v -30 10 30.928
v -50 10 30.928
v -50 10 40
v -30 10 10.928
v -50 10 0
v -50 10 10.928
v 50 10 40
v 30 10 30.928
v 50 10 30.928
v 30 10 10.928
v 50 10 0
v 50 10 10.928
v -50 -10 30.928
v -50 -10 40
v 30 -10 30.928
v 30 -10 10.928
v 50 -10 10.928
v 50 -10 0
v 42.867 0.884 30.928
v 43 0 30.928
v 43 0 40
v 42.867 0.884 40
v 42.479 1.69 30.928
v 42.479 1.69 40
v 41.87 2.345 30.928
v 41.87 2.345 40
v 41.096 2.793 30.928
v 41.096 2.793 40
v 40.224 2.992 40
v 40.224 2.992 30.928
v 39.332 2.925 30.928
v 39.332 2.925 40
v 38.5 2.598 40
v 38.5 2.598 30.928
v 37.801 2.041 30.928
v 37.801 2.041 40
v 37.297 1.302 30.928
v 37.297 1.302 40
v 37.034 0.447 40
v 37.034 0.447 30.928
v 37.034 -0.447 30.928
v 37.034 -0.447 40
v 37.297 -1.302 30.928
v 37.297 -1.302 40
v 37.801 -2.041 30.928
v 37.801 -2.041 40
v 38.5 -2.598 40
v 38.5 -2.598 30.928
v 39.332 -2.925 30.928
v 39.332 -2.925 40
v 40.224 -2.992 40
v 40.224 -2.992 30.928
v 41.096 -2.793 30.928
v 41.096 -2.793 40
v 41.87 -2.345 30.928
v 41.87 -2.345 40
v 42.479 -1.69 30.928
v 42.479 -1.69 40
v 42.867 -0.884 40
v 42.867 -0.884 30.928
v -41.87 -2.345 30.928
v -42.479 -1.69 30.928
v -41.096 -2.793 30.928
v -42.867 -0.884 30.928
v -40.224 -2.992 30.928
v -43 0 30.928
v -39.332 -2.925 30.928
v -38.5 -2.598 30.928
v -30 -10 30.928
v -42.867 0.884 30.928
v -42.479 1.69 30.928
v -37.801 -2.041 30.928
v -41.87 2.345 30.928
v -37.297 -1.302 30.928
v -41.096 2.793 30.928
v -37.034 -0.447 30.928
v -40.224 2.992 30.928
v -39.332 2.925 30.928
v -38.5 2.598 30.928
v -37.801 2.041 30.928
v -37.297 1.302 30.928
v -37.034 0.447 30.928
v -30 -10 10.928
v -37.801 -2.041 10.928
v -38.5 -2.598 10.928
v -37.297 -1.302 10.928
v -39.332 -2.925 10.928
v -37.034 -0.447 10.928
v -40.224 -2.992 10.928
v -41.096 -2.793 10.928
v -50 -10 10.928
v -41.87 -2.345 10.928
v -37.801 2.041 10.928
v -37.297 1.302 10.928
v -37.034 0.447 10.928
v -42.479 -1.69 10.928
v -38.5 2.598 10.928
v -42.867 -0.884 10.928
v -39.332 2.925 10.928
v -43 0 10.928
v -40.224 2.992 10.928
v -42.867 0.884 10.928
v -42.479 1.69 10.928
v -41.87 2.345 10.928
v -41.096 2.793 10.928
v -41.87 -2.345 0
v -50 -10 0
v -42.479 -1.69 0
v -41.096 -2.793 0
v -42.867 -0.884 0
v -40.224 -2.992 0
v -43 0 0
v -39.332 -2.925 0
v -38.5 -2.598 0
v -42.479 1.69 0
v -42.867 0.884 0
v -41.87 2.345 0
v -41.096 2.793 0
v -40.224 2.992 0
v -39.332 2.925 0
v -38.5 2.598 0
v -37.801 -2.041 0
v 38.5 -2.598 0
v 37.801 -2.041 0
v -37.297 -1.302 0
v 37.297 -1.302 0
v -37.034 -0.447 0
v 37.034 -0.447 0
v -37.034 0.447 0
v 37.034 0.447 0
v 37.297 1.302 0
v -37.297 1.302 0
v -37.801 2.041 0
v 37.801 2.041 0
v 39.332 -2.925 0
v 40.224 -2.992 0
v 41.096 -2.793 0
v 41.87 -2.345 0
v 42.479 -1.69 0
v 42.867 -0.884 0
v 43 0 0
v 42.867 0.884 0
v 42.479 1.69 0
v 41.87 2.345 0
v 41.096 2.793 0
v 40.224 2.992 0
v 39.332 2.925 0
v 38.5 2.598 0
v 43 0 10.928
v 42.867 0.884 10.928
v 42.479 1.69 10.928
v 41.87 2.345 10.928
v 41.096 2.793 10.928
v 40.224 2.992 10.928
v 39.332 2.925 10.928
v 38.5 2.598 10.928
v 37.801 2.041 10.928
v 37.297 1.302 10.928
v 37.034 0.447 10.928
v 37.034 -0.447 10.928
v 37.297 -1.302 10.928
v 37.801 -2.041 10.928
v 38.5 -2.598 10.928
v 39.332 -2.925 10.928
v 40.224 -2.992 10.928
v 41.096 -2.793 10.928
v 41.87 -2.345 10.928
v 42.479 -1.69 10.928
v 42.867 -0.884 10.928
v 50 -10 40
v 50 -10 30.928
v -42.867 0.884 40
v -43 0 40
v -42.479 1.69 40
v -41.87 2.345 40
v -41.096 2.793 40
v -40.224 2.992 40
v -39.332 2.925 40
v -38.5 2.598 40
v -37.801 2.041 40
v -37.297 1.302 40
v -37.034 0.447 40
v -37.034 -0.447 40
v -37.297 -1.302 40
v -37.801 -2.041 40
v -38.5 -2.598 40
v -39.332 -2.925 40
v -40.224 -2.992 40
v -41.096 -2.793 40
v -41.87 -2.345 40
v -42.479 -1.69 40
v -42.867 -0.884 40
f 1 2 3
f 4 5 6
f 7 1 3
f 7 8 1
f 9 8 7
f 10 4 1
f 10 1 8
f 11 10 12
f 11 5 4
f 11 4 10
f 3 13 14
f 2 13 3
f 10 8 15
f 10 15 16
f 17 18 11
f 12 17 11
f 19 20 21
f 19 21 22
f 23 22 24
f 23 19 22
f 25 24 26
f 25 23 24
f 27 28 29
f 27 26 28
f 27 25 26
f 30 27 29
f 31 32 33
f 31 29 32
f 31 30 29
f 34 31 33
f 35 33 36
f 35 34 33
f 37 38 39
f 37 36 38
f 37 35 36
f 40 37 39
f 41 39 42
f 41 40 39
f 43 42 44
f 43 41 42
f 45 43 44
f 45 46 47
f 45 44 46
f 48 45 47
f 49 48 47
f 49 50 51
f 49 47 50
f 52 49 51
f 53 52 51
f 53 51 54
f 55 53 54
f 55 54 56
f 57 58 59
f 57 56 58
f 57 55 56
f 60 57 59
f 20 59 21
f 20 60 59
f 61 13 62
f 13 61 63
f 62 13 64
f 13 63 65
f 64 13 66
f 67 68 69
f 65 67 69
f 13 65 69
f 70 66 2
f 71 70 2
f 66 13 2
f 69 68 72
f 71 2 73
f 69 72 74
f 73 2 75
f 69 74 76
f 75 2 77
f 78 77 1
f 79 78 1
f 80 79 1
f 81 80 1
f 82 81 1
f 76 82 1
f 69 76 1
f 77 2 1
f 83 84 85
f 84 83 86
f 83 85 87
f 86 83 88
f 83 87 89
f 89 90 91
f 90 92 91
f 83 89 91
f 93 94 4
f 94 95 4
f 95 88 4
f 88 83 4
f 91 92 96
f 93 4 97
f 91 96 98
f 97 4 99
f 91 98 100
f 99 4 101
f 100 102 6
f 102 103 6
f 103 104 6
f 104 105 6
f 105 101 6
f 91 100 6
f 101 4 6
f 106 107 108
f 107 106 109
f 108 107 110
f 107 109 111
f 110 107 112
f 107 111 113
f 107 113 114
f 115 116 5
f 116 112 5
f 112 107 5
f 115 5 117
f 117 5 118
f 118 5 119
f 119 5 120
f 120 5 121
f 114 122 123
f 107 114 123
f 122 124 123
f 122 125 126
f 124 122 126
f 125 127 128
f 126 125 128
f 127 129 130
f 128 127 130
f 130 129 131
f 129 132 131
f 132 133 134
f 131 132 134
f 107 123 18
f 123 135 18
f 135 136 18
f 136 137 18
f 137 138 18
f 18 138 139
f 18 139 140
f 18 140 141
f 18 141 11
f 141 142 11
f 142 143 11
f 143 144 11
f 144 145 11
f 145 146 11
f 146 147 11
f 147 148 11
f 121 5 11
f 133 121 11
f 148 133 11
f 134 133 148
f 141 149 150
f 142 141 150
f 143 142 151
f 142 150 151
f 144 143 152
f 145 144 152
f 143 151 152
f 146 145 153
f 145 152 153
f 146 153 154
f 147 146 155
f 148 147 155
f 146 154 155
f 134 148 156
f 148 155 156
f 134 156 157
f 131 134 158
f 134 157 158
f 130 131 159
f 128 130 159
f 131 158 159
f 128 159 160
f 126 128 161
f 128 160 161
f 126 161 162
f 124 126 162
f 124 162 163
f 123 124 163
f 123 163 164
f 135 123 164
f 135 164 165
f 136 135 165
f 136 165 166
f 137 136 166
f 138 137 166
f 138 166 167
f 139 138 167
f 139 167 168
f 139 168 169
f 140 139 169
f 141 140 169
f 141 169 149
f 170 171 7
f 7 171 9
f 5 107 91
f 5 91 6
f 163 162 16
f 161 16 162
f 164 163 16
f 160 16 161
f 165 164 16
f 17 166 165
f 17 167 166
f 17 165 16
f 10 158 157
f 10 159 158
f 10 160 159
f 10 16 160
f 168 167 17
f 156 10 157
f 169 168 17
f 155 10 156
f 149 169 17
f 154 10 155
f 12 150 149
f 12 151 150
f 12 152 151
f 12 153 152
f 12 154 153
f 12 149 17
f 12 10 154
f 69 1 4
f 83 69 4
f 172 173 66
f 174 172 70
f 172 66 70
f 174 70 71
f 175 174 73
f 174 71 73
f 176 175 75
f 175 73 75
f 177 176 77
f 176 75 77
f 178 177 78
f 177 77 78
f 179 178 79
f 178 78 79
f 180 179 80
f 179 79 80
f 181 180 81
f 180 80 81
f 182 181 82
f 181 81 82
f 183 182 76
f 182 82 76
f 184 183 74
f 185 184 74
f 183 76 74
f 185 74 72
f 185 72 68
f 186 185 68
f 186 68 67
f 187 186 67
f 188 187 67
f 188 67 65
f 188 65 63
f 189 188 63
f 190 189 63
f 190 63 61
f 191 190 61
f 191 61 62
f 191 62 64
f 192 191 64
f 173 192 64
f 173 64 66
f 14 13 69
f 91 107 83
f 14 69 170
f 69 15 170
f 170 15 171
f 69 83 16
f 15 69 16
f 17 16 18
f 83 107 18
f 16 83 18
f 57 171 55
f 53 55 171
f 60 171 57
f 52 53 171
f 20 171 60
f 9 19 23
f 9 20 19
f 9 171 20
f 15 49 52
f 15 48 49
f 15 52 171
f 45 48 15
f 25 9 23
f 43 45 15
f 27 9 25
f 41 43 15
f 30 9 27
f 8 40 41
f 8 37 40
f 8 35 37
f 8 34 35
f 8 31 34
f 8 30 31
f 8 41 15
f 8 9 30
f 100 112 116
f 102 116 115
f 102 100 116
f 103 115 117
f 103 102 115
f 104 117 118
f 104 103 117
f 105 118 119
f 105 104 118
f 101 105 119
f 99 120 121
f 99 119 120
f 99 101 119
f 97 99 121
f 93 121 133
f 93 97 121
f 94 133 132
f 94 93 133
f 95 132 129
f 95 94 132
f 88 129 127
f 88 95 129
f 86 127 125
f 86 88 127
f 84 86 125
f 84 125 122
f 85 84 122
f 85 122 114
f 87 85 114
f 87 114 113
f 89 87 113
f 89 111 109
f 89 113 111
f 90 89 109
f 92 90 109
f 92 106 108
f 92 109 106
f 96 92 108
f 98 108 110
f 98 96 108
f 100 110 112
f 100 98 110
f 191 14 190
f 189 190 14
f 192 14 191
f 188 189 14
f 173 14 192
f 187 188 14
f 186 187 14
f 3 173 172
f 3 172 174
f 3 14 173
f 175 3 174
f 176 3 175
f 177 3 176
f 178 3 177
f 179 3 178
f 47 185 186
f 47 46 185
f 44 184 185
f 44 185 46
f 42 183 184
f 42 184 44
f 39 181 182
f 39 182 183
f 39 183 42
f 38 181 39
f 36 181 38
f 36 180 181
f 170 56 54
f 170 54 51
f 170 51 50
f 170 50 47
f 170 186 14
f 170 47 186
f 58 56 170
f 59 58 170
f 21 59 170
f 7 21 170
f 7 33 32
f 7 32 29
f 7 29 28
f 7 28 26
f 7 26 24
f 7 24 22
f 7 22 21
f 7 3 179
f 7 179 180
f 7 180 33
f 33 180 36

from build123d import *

# Parameters (mm, degrees)
SKETCH_1_W               = 100
SKETCH_1_H               = 20
EXTRUDE_1_DEPTH          = 40
CUT_EXTRUDE_1_DEPTH      = 68.082039325
SKETCH_4_R               = 3
CUT_EXTRUDE_2_DEPTH      = 59.695433862
MIRROR_3_COPY_1_SKETCH_R = 3
MIRROR_3_COPY_1_DEPTH    = 59.695433862


with BuildPart() as part:
    # 草图1 → 凸台-拉伸1 (new body)
    with BuildSketch(Plane.XY):
        Rectangle(SKETCH_1_W, SKETCH_1_H)
    extrude(amount=EXTRUDE_1_DEPTH)

    # 草图2 → 切除-拉伸1 (cut, through all)
    with BuildSketch(Plane(origin=(0, 10, 0), x_dir=(1, 0, 0), z_dir=(0, 1, 0))):
        Polygon((50, -10.928468285), (50, -20.928468285), (50, -30.928468285), (30, -30.928468285), (30, -10.928468285), align=None)
    cut_extrude_1 = extrude(amount=-CUT_EXTRUDE_1_DEPTH, mode=Mode.SUBTRACT)

    # 镜向1: 切除-拉伸1 across plane
    add(cut_extrude_1.mirror(Plane(origin=(0, 0, 0), x_dir=(0, 0, 1), z_dir=(1, 0, 0))), mode=Mode.SUBTRACT)

    # 草图4 → 切除-拉伸2 (cut, through all)
    with BuildSketch(Plane.XY.offset(10.928468285)):
        with Locations((40, 0)):
            Circle(SKETCH_4_R)
    cut_extrude_2 = extrude(amount=-CUT_EXTRUDE_2_DEPTH, mode=Mode.SUBTRACT)

    # 镜向2: 切除-拉伸2 across plane
    add(cut_extrude_2.mirror(Plane(origin=(0, 0, 0), x_dir=(0, 0, 1), z_dir=(1, 0, 0))), mode=Mode.SUBTRACT)

    # 镜向3: 切除-拉伸2 across plane
    add(cut_extrude_2.mirror(Plane.XY.offset(20)), mode=Mode.SUBTRACT)

    # 镜向3 copy 1 sketch → 镜向3 copy 1 (cut, through all)
    with BuildSketch(Plane(origin=(0, 0, 29.071531715), x_dir=(-1, 0, 0), z_dir=(0, 0, -1))):
        with Locations((40, 0)):
            Circle(MIRROR_3_COPY_1_SKETCH_R)
    extrude(amount=-MIRROR_3_COPY_1_DEPTH, mode=Mode.SUBTRACT)


solid = part.part
